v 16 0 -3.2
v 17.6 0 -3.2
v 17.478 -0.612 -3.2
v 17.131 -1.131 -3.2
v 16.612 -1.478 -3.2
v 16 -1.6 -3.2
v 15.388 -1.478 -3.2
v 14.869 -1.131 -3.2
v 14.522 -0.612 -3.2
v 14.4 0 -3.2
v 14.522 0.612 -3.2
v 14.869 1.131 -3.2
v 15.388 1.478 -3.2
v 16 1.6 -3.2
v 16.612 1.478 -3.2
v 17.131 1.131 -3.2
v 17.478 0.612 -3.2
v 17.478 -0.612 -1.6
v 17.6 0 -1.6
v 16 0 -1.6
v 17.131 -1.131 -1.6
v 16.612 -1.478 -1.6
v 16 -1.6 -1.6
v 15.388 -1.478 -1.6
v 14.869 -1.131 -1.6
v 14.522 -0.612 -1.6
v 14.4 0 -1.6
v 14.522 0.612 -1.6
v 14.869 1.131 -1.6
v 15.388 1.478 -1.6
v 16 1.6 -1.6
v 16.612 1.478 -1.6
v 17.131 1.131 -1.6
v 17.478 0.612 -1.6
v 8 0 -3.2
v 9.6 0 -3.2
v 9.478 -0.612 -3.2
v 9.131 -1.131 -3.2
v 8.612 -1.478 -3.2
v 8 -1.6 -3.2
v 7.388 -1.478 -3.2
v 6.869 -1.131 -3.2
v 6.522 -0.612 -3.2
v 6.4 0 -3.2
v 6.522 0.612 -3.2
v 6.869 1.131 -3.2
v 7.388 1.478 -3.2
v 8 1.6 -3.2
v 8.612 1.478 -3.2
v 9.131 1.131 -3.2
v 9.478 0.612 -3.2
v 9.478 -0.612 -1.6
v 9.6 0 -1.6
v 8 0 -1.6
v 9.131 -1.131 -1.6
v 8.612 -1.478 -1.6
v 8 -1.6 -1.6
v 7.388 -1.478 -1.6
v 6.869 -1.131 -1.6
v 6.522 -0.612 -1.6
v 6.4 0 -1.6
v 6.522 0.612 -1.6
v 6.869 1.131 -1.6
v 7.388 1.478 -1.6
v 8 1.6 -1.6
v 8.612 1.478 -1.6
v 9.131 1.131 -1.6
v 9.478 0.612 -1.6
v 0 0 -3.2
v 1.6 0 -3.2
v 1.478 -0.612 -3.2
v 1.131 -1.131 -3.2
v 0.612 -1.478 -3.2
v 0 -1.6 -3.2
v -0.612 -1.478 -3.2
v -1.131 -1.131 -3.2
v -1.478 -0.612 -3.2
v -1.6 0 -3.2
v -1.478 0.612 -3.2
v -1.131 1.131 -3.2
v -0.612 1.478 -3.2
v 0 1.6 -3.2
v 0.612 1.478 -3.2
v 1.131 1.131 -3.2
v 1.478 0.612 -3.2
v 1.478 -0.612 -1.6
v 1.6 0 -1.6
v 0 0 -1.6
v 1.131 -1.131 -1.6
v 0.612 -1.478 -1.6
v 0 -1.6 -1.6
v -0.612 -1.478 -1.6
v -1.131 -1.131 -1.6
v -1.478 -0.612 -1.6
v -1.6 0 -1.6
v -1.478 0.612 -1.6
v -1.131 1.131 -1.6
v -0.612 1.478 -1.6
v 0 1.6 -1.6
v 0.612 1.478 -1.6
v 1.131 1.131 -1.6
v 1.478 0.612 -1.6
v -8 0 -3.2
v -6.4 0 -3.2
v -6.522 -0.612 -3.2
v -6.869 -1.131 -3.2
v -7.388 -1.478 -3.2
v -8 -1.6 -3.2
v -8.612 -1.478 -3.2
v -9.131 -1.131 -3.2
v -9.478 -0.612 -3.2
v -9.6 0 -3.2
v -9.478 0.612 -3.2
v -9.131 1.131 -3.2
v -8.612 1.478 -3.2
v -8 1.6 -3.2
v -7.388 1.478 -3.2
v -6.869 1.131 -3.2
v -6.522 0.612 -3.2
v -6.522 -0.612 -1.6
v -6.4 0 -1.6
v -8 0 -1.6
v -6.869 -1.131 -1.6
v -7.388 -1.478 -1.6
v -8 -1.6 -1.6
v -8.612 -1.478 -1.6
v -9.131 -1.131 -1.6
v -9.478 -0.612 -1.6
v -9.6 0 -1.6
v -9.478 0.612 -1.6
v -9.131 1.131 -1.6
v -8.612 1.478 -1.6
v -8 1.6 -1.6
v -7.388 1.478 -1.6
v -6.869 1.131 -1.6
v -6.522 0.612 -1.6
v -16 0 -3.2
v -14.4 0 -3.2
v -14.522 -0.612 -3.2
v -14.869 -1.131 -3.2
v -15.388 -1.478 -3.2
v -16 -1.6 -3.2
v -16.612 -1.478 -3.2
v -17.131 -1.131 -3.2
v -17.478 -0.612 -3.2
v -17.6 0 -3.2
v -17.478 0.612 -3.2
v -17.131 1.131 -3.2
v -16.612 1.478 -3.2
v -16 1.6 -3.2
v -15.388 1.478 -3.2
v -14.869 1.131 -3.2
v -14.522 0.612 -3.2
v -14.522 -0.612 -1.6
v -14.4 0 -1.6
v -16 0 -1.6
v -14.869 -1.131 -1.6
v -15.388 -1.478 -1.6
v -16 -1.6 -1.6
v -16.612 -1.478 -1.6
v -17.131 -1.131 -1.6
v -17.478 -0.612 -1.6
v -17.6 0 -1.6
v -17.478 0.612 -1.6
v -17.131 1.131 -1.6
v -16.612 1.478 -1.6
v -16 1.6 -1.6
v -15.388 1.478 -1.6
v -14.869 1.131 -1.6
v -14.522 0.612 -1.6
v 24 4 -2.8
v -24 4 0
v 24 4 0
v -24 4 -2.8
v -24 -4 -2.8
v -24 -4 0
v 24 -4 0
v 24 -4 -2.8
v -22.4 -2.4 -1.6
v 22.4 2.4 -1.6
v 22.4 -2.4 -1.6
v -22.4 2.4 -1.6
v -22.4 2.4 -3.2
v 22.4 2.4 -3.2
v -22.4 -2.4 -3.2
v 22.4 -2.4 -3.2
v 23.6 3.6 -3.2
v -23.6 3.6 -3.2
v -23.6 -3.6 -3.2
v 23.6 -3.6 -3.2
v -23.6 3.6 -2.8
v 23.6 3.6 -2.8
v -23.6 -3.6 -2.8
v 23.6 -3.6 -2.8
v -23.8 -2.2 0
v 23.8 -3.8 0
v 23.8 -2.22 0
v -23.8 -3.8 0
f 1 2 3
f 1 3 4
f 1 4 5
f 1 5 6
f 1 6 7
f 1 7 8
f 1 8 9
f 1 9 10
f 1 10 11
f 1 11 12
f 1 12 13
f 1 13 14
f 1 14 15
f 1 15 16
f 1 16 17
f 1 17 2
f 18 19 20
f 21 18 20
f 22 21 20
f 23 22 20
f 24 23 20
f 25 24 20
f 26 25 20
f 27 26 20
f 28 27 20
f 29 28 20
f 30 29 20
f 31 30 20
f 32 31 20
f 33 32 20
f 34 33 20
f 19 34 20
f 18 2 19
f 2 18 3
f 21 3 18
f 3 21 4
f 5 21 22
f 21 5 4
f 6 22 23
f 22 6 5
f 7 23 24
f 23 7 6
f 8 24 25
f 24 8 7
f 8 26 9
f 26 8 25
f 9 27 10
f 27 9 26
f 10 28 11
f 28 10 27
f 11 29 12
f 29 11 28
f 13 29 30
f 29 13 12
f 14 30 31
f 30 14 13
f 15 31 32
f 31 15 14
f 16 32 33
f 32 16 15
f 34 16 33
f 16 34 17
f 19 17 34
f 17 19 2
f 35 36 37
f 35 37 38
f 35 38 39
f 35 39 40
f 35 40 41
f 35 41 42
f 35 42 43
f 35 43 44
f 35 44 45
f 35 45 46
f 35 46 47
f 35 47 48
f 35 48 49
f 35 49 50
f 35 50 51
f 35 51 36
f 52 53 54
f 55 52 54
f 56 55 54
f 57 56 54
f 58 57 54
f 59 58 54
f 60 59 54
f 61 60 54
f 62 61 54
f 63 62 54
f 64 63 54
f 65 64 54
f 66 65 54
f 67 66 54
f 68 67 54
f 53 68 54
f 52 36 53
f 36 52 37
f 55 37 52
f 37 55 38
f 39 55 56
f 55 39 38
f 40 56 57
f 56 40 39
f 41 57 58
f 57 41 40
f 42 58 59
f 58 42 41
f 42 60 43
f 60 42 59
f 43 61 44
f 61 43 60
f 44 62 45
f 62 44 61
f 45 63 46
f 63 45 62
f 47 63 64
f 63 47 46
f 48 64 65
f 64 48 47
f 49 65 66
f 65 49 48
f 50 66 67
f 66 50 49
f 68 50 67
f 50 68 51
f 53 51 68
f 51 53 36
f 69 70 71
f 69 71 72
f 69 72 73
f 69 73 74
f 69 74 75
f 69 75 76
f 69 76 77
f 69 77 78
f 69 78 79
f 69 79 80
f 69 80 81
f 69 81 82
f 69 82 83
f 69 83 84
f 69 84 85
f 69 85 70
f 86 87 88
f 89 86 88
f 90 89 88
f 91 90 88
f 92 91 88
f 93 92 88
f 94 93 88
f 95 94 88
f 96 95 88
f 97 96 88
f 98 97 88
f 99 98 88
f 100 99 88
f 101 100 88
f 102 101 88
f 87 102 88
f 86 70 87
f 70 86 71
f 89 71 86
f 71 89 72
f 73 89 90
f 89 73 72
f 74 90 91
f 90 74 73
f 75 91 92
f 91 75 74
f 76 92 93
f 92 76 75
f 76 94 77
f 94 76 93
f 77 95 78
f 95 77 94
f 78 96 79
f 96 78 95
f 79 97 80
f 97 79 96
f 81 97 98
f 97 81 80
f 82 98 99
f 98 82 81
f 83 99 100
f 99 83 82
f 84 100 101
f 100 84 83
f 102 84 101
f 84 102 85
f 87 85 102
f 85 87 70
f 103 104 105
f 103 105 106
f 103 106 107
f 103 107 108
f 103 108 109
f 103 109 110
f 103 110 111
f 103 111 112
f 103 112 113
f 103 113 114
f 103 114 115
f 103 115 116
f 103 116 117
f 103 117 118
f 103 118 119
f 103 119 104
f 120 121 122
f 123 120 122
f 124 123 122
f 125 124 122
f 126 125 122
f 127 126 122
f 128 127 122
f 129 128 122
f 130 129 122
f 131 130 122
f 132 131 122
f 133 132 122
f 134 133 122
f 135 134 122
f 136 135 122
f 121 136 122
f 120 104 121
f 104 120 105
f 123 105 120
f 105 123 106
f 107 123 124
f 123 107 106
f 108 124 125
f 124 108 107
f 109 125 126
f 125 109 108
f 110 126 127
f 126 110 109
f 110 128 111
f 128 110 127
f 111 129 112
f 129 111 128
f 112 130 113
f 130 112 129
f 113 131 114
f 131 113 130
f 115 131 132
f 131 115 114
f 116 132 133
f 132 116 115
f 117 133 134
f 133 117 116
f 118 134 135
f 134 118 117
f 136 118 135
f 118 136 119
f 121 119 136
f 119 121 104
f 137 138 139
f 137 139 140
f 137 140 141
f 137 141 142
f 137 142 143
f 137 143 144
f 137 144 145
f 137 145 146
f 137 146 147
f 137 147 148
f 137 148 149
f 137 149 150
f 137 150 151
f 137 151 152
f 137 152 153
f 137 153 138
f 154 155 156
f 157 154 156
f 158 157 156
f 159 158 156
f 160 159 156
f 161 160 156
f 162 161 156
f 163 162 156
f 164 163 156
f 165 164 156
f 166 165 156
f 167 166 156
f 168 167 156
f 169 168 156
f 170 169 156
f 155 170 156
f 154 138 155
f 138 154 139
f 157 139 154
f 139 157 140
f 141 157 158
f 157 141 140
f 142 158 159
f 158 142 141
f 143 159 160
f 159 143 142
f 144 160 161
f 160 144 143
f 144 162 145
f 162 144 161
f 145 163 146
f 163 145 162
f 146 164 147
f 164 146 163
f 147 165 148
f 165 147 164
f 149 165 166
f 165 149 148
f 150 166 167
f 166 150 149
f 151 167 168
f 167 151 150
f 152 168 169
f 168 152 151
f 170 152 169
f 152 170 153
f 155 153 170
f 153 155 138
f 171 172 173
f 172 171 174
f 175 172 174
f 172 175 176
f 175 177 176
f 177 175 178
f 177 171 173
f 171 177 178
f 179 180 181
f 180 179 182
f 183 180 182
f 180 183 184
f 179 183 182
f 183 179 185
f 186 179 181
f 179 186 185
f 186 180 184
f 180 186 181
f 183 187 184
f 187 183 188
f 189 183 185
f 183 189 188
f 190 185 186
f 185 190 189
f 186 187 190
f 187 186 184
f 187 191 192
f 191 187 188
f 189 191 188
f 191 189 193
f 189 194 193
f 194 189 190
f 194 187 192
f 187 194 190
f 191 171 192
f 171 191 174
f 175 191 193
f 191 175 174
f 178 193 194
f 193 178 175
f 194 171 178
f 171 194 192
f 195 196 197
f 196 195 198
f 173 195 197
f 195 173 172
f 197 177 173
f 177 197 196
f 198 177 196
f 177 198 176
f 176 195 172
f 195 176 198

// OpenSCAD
// file: ../p/4-4edge.scad
use <../lib.scad>
function ldraw_lib__4_4edge() = [
// 0 Circle 1.0
// 0 Name: 4-4edge.dat
// 0 Author: James Jessiman
// 0 !LDRAW_ORG Primitive UPDATE 2017-01
// 0 !LICENSE Licensed under CC BY 2.0 and CC BY 4.0 : see CAreadme.txt
// 
// 0 BFC CERTIFY CCW
  [0,"BFC","CERTIFY"],
  [0,"BFC","CCW"],
// 
// 0 !HISTORY 1998-12-15 [PTadmin] Official Update 1998-10
// 0 !HISTORY 2005-12-28 [PTadmin] Official Update 2005-01
// 0 !HISTORY 2007-06-24 [PTadmin] Header formatted for Contributor Agreement
// 0 !HISTORY 2008-07-01 [PTadmin] Official Update 2008-01
// 0 !HISTORY 2017-01-15 [Steffen] BFCed
// 0 !HISTORY 2017-12-30 [PTadmin] Official Update 2017-01
// 
// 
// 2 24 1 0 0 0.9239 0 0.3827
  [2,24,1,0,0,0.9239,0,0.3827],
// 2 24 0.9239 0 0.3827 0.7071 0 0.7071
  [2,24,0.9239,0,0.3827,0.7071,0,0.7071],
// 2 24 0.7071 0 0.7071 0.3827 0 0.9239
  [2,24,0.7071,0,0.7071,0.3827,0,0.9239],
// 2 24 0.3827 0 0.9239 0 0 1
  [2,24,0.3827,0,0.9239,0,0,1],
// 2 24 0 0 1 -0.3827 0 0.9239
  [2,24,0,0,1,-0.3827,0,0.9239],
// 2 24 -0.3827 0 0.9239 -0.7071 0 0.7071
  [2,24,-0.3827,0,0.9239,-0.7071,0,0.7071],
// 2 24 -0.7071 0 0.7071 -0.9239 0 0.3827
  [2,24,-0.7071,0,0.7071,-0.9239,0,0.3827],
// 2 24 -0.9239 0 0.3827 -1 0 -0
  [2,24,-0.9239,0,0.3827,-1,0,-0],
// 2 24 -1 0 -0 -0.9239 0 -0.3827
  [2,24,-1,0,-0,-0.9239,0,-0.3827],
// 2 24 -0.9239 0 -0.3827 -0.7071 0 -0.7071
  [2,24,-0.9239,0,-0.3827,-0.7071,0,-0.7071],
// 2 24 -0.7071 0 -0.7071 -0.3827 0 -0.9239
  [2,24,-0.7071,0,-0.7071,-0.3827,0,-0.9239],
// 2 24 -0.3827 0 -0.9239 0 0 -1
  [2,24,-0.3827,0,-0.9239,0,0,-1],
// 2 24 0 0 -1 0.3827 0 -0.9239
  [2,24,0,0,-1,0.3827,0,-0.9239],
// 2 24 0.3827 0 -0.9239 0.7071 0 -0.7071
  [2,24,0.3827,0,-0.9239,0.7071,0,-0.7071],
// 2 24 0.7071 0 -0.7071 0.9239 0 -0.3827
  [2,24,0.7071,0,-0.7071,0.9239,0,-0.3827],
// 2 24 0.9239 0 -0.3827 1 0 0
  [2,24,0.9239,0,-0.3827,1,0,0],
];
module ldraw_lib__4_4edge(step=0, col=false, unit=2/5, alt=false, line=0.2, solid=!$preview)
    makepoly(ldraw_lib__4_4edge(), step=step, col=col, unit=unit, alt=alt, line=line, solid=solid);
ldraw_lib__4_4edge(line=0.2);
// file: ../p/4-4disc.scad
use <../lib.scad>
function ldraw_lib__4_4disc() = [
// 0 Disc 1.0
// 0 Name: 4-4disc.dat
// 0 Author: James Jessiman
// 0 !LDRAW_ORG Primitive UPDATE 2002-02
// 0 !LICENSE Licensed under CC BY 2.0 and CC BY 4.0 : see CAreadme.txt
// 
// 0 BFC CERTIFY CCW
  [0,"BFC","CERTIFY"],
  [0,"BFC","CCW"],
// 
// 0 !HISTORY 1998-12-15 [PTadmin] Official Update 1998-10
// 0 !HISTORY 2002-03-23 [sbliss] Added BFC statement
// 0 !HISTORY 2002-04-25 [PTadmin] Official Update 2002-02
// 0 !HISTORY 2007-06-24 [PTadmin] Header formatted for Contributor Agreement
// 0 !HISTORY 2008-07-01 [PTadmin] Official Update 2008-01
// 
// 
// 3 16 0 0 0 1 0 0 0.9239 0 0.3827
  [3,16,0,0,0,1,0,0,0.9239,0,0.3827],
// 3 16 0 0 0 0.9239 0 0.3827 0.7071 0 0.7071
  [3,16,0,0,0,0.9239,0,0.3827,0.7071,0,0.7071],
// 3 16 0 0 0 0.7071 0 0.7071 0.3827 0 0.9239
  [3,16,0,0,0,0.7071,0,0.7071,0.3827,0,0.9239],
// 3 16 0 0 0 0.3827 0 0.9239 0 0 1
  [3,16,0,0,0,0.3827,0,0.9239,0,0,1],
// 3 16 0 0 0 0 0 1 -0.3827 0 0.9239
  [3,16,0,0,0,0,0,1,-0.3827,0,0.9239],
// 3 16 0 0 0 -0.3827 0 0.9239 -0.7071 0 0.7071
  [3,16,0,0,0,-0.3827,0,0.9239,-0.7071,0,0.7071],
// 3 16 0 0 0 -0.7071 0 0.7071 -0.9239 0 0.3827
  [3,16,0,0,0,-0.7071,0,0.7071,-0.9239,0,0.3827],
// 3 16 0 0 0 -0.9239 0 0.3827 -1 0 -0
  [3,16,0,0,0,-0.9239,0,0.3827,-1,0,-0],
// 3 16 0 0 0 -1 0 -0 -0.9239 0 -0.3827
  [3,16,0,0,0,-1,0,-0,-0.9239,0,-0.3827],
// 3 16 0 0 0 -0.9239 0 -0.3827 -0.7071 0 -0.7071
  [3,16,0,0,0,-0.9239,0,-0.3827,-0.7071,0,-0.7071],
// 3 16 0 0 0 -0.7071 0 -0.7071 -0.3827 0 -0.9239
  [3,16,0,0,0,-0.7071,0,-0.7071,-0.3827,0,-0.9239],
// 3 16 0 0 0 -0.3827 0 -0.9239 0 0 -1
  [3,16,0,0,0,-0.3827,0,-0.9239,0,0,-1],
// 3 16 0 0 0 0 0 -1 0.3827 0 -0.9239
  [3,16,0,0,0,0,0,-1,0.3827,0,-0.9239],
// 3 16 0 0 0 0.3827 0 -0.9239 0.7071 0 -0.7071
  [3,16,0,0,0,0.3827,0,-0.9239,0.7071,0,-0.7071],
// 3 16 0 0 0 0.7071 0 -0.7071 0.9239 0 -0.3827
  [3,16,0,0,0,0.7071,0,-0.7071,0.9239,0,-0.3827],
// 3 16 0 0 0 0.9239 0 -0.3827 1 0 0
  [3,16,0,0,0,0.9239,0,-0.3827,1,0,0],
// 0
];
module ldraw_lib__4_4disc(step=0, col=false, unit=2/5, alt=false, line=0.2, solid=!$preview)
    makepoly(ldraw_lib__4_4disc(), step=step, col=col, unit=unit, alt=alt, line=line, solid=solid);
ldraw_lib__4_4disc(line=0.2);
// file: ../p/4-4cyli.scad
use <../lib.scad>
$fa=1; $fs=0.2;
function ldraw_lib__4_4cyli(realsolid=false) = [
// 0 Cylinder 1.0
// 0 Name: 4-4cyli.dat
// 0 Author: James Jessiman
// 0 !LDRAW_ORG Primitive UPDATE 2005-01
// 0 !LICENSE Licensed under CC BY 2.0 and CC BY 4.0 : see CAreadme.txt
// 
// 0 BFC CERTIFY CCW
  [0,"BFC","CERTIFY"],
  [0,"BFC","CCW"],
// 
// 0 !HISTORY 1998-12-15 [PTadmin] Official Update 1998-10
// 0 !HISTORY 2002-03-23 [sbliss] Added BFC statement; merged headers from files in distributions LDraw 0.27 and Complete.
// 0 !HISTORY 2002-04-25 [PTadmin] Official Update 2002-02
// 0 !HISTORY 2004-12-14 [guyvivan] BFC CCW
// 0 !HISTORY 2005-12-28 [PTadmin] Official Update 2005-01
// 0 !HISTORY 2007-06-24 [PTadmin] Header formatted for Contributor Agreement
// 0 !HISTORY 2008-07-01 [PTadmin] Official Update 2008-01
// 
// 
// 4 16 1 1 0 0.9239 1 0.3827 0.9239 0 0.3827 1 0 0
  [4,16,1,1,0,0.9239,1,0.3827,0.9239,0,0.3827,1,0,0],
// 5 24 1 0 0 1 1 0 0.9239 0 0.3827 0.9239 0 -0.3827
  [5,24,1,0,0,1,1,0,0.9239,0,0.3827,0.9239,0,-0.3827],
// 4 16 0.9239 1 0.3827 0.7071 1 0.7071 0.7071 0 0.7071 0.9239 0 0.3827
  [4,16,0.9239,1,0.3827,0.7071,1,0.7071,0.7071,0,0.7071,0.9239,0,0.3827],
// 5 24 0.9239 0 0.3827 0.9239 1 0.3827 0.7071 0 0.7071 1 0 0
  [5,24,0.9239,0,0.3827,0.9239,1,0.3827,0.7071,0,0.7071,1,0,0],
// 4 16 0.7071 1 0.7071 0.3827 1 0.9239 0.3827 0 0.9239 0.7071 0 0.7071
  [4,16,0.7071,1,0.7071,0.3827,1,0.9239,0.3827,0,0.9239,0.7071,0,0.7071],
// 5 24 0.7071 0 0.7071 0.7071 1 0.7071 0.3827 0 0.9239 0.9239 0 0.3827
  [5,24,0.7071,0,0.7071,0.7071,1,0.7071,0.3827,0,0.9239,0.9239,0,0.3827],
// 4 16 0.3827 1 0.9239 0 1 1 0 0 1 0.3827 0 0.9239
  [4,16,0.3827,1,0.9239,0,1,1,0,0,1,0.3827,0,0.9239],
// 5 24 0.3827 0 0.9239 0.3827 1 0.9239 0 0 1 0.7071 0 0.7071
  [5,24,0.3827,0,0.9239,0.3827,1,0.9239,0,0,1,0.7071,0,0.7071],
// 4 16 0 1 1 -0.3827 1 0.9239 -0.3827 0 0.9239 0 0 1
  [4,16,0,1,1,-0.3827,1,0.9239,-0.3827,0,0.9239,0,0,1],
// 5 24 0 0 1 0 1 1 -0.3827 0 0.9239 0.3827 0 0.9239
  [5,24,0,0,1,0,1,1,-0.3827,0,0.9239,0.3827,0,0.9239],
// 4 16 -0.3827 1 0.9239 -0.7071 1 0.7071 -0.7071 0 0.7071 -0.3827 0 0.9239
  [4,16,-0.3827,1,0.9239,-0.7071,1,0.7071,-0.7071,0,0.7071,-0.3827,0,0.9239],
// 5 24 -0.3827 0 0.9239 -0.3827 1 0.9239 -0.7071 0 0.7071 0 0 1
  [5,24,-0.3827,0,0.9239,-0.3827,1,0.9239,-0.7071,0,0.7071,0,0,1],
// 4 16 -0.7071 1 0.7071 -0.9239 1 0.3827 -0.9239 0 0.3827 -0.7071 0 0.7071
  [4,16,-0.7071,1,0.7071,-0.9239,1,0.3827,-0.9239,0,0.3827,-0.7071,0,0.7071],
// 5 24 -0.7071 0 0.7071 -0.7071 1 0.7071 -0.9239 0 0.3827 -0.3827 0 0.9239
  [5,24,-0.7071,0,0.7071,-0.7071,1,0.7071,-0.9239,0,0.3827,-0.3827,0,0.9239],
// 4 16 -0.9239 1 0.3827 -1 1 0 -1 0 0 -0.9239 0 0.3827
  [4,16,-0.9239,1,0.3827,-1,1,0,-1,0,0,-0.9239,0,0.3827],
// 5 24 -0.9239 0 0.3827 -0.9239 1 0.3827 -1 0 0 -0.7071 0 0.7071
  [5,24,-0.9239,0,0.3827,-0.9239,1,0.3827,-1,0,0,-0.7071,0,0.7071],
// 4 16 -1 1 0 -0.9239 1 -0.3827 -0.9239 0 -0.3827 -1 0 0
  [4,16,-1,1,0,-0.9239,1,-0.3827,-0.9239,0,-0.3827,-1,0,0],
// 5 24 -1 0 0 -1 1 0 -0.9239 0 -0.3827 -0.9239 0 0.3827
  [5,24,-1,0,0,-1,1,0,-0.9239,0,-0.3827,-0.9239,0,0.3827],
// 4 16 -0.9239 1 -0.3827 -0.7071 1 -0.7071 -0.7071 0 -0.7071 -0.9239 0 -0.3827
  [4,16,-0.9239,1,-0.3827,-0.7071,1,-0.7071,-0.7071,0,-0.7071,-0.9239,0,-0.3827],
// 5 24 -0.9239 0 -0.3827 -0.9239 1 -0.3827 -0.7071 0 -0.7071 -1 0 0
  [5,24,-0.9239,0,-0.3827,-0.9239,1,-0.3827,-0.7071,0,-0.7071,-1,0,0],
// 4 16 -0.7071 1 -0.7071 -0.3827 1 -0.9239 -0.3827 0 -0.9239 -0.7071 0 -0.7071
  [4,16,-0.7071,1,-0.7071,-0.3827,1,-0.9239,-0.3827,0,-0.9239,-0.7071,0,-0.7071],
// 5 24 -0.7071 0 -0.7071 -0.7071 1 -0.7071 -0.3827 0 -0.9239 -0.9239 0 -0.3827
  [5,24,-0.7071,0,-0.7071,-0.7071,1,-0.7071,-0.3827,0,-0.9239,-0.9239,0,-0.3827],
// 4 16 -0.3827 1 -0.9239 0 1 -1 0 0 -1 -0.3827 0 -0.9239
  [4,16,-0.3827,1,-0.9239,0,1,-1,0,0,-1,-0.3827,0,-0.9239],
// 5 24 -0.3827 0 -0.9239 -0.3827 1 -0.9239 0 0 -1 -0.7071 0 -0.7071
  [5,24,-0.3827,0,-0.9239,-0.3827,1,-0.9239,0,0,-1,-0.7071,0,-0.7071],
// 4 16 0 1 -1 0.3827 1 -0.9239 0.3827 0 -0.9239 0 0 -1
  [4,16,0,1,-1,0.3827,1,-0.9239,0.3827,0,-0.9239,0,0,-1],
// 5 24 0 0 -1 0 1 -1 0.3827 0 -0.9239 -0.3827 0 -0.9239
  [5,24,0,0,-1,0,1,-1,0.3827,0,-0.9239,-0.3827,0,-0.9239],
// 4 16 0.3827 1 -0.9239 0.7071 1 -0.7071 0.7071 0 -0.7071 0.3827 0 -0.9239
  [4,16,0.3827,1,-0.9239,0.7071,1,-0.7071,0.7071,0,-0.7071,0.3827,0,-0.9239],
// 5 24 0.3827 0 -0.9239 0.3827 1 -0.9239 0.7071 0 -0.7071 0 0 -1
  [5,24,0.3827,0,-0.9239,0.3827,1,-0.9239,0.7071,0,-0.7071,0,0,-1],
// 4 16 0.7071 1 -0.7071 0.9239 1 -0.3827 0.9239 0 -0.3827 0.7071 0 -0.7071
  [4,16,0.7071,1,-0.7071,0.9239,1,-0.3827,0.9239,0,-0.3827,0.7071,0,-0.7071],
// 5 24 0.7071 0 -0.7071 0.7071 1 -0.7071 0.9239 0 -0.3827 0.3827 0 -0.9239
  [5,24,0.7071,0,-0.7071,0.7071,1,-0.7071,0.9239,0,-0.3827,0.3827,0,-0.9239],
// 4 16 0.9239 1 -0.3827 1 1 0 1 0 0 0.9239 0 -0.3827
  [4,16,0.9239,1,-0.3827,1,1,0,1,0,0,0.9239,0,-0.3827],
// 5 24 0.9239 0 -0.3827 0.9239 1 -0.3827 1 0 0 0.7071 0 -0.7071
  [5,24,0.9239,0,-0.3827,0.9239,1,-0.3827,1,0,0,0.7071,0,-0.7071],
// 0
];
module ldraw_lib__4_4cyli(step=0, col=false, unit=2/5, alt=false, line=0.2, solid=!$preview)
    makepoly(ldraw_lib__4_4cyli(solid), step=step, col=col, unit=unit, alt=alt, line=line, solid=solid);
ldraw_lib__4_4cyli(line=0.2);
// file: ../p/stud3.scad
use <../lib.scad>
use <4-4cyli.scad>
use <4-4disc.scad>
use <4-4edge.scad>
function ldraw_lib__stud3() = [
// 0 Stud Tube Solid
// 0 Name: stud3.dat
// 0 Author: James Jessiman
// 0 !LDRAW_ORG Primitive UPDATE 2012-01
// 0 !LICENSE Licensed under CC BY 4.0 : see CAreadme.txt
// 
// 0 BFC CERTIFY CCW
  [0,"BFC","CERTIFY"],
  [0,"BFC","CCW"],
// 
// 0 !HISTORY 2002-04-04 [sbliss] Modified for BFC compliance
// 0 !HISTORY 2002-04-25 [PTadmin] Official Update 2002-02
// 0 !HISTORY 2007-06-24 [PTadmin] Header formatted for Contributor Agreement
// 0 !HISTORY 2008-07-01 [PTadmin] Official Update 2008-01
// 0 !HISTORY 2012-02-16 [Philo] Changed to CCW
// 0 !HISTORY 2012-03-30 [PTadmin] Official Update 2012-01
// 
// 
// 1 16 0 -4 0 4 0 0 0 1 0 0 0 4 4-4edge.dat
  [1,16,0,-4,0,4,0,0,0,1,0,0,0,4, ldraw_lib__4_4edge()],
// 1 16 0 0 0 4 0 0 0 1 0 0 0 4 4-4edge.dat
  [1,16,0,0,0,4,0,0,0,1,0,0,0,4, ldraw_lib__4_4edge()],
// 1 16 0 -4 0 4 0 0 0 1 0 0 0 4 4-4disc.dat
  [1,16,0,-4,0,4,0,0,0,1,0,0,0,4, ldraw_lib__4_4disc()],
  [-1,16,0,0,0,4,0,0,0,-1,0,0,0,4, ldraw_lib__4_4disc()],
// 1 16 0 -4 0 4 0 0 0 4 0 0 0 4 4-4cyli.dat
  [1,16,0,-4,0,4,0,0,0,4,0,0,0,4, ldraw_lib__4_4cyli()],
];
module ldraw_lib__stud3(step=0, col=false, unit=2/5, alt=false, line=0.2, solid=!$preview)
    makepoly(ldraw_lib__stud3(), step=step, col=col, unit=unit, alt=alt, line=line, solid=solid);
ldraw_lib__stud3(line=0.2);
// file: ../p/box5.scad
use <../lib.scad>
function ldraw_lib__box5() = [
// 0 Box with 5 Faces and All Edges
// 0 Name: box5.dat
// 0 Author: James Jessiman
// 0 !LDRAW_ORG Primitive UPDATE 2012-01
// 0 !LICENSE Licensed under CC BY 2.0 and CC BY 4.0 : see CAreadme.txt
// 
// 0 BFC CERTIFY CCW
  [0,"BFC","CERTIFY"],
  [0,"BFC","CCW"],
// 
// 0 !HISTORY 2002-04-03 [sbliss] Modified for BFC compliance
// 0 !HISTORY 2002-04-25 [PTadmin] Official Update 2002-02
// 0 !HISTORY 2007-06-24 [PTadmin] Header formatted for Contributor Agreement
// 0 !HISTORY 2008-07-01 [PTadmin] Official Update 2008-01
// 0 !HISTORY 2012-02-16 [Philo] Changed to CCW
// 0 !HISTORY 2012-03-30 [PTadmin] Official Update 2012-01
// 
// 
// 2 24 1 1 1 -1 1 1
  [2,24,1,1,1,-1,1,1],
// 2 24 -1 1 1 -1 1 -1
  [2,24,-1,1,1,-1,1,-1],
// 2 24 -1 1 -1 1 1 -1
  [2,24,-1,1,-1,1,1,-1],
// 2 24 1 1 -1 1 1 1
  [2,24,1,1,-1,1,1,1],
// 2 24 1 0 1 -1 0 1
  [2,24,1,0,1,-1,0,1],
// 2 24 -1 0 1 -1 0 -1
  [2,24,-1,0,1,-1,0,-1],
// 2 24 -1 0 -1 1 0 -1
  [2,24,-1,0,-1,1,0,-1],
// 2 24 1 0 -1 1 0 1
  [2,24,1,0,-1,1,0,1],
// 2 24 1 0 1 1 1 1
  [2,24,1,0,1,1,1,1],
// 2 24 -1 0 1 -1 1 1
  [2,24,-1,0,1,-1,1,1],
// 2 24 1 0 -1 1 1 -1
  [2,24,1,0,-1,1,1,-1],
// 2 24 -1 0 -1 -1 1 -1
  [2,24,-1,0,-1,-1,1,-1],
// 4 16 -1 1 1 1 1 1 1 1 -1 -1 1 -1
  [4,16,-1,1,1,1,1,1,1,1,-1,-1,1,-1],
// 4 16 -1 1 1 -1 0 1 1 0 1 1 1 1
  [4,16,-1,1,1,-1,0,1,1,0,1,1,1,1],
// 4 16 -1 1 -1 -1 0 -1 -1 0 1 -1 1 1
  [4,16,-1,1,-1,-1,0,-1,-1,0,1,-1,1,1],
// 4 16 1 1 -1 1 0 -1 -1 0 -1 -1 1 -1
  [4,16,1,1,-1,1,0,-1,-1,0,-1,-1,1,-1],
// 4 16 1 1 1 1 0 1 1 0 -1 1 1 -1
  [4,16,1,1,1,1,0,1,1,0,-1,1,1,-1],
];
makepoly(ldraw_lib__box5(), line=0.2);
// file: ../p/box4.scad
use <../lib.scad>
function ldraw_lib__box4() = [
// 0 Box with 4 Faces (2 Parallel Pairs) and All Edges
// 0 Name: box4.dat
// 0 Author: James Jessiman
// 0 !LDRAW_ORG Primitive UPDATE 2012-01
// 0 !LICENSE Licensed under CC BY 4.0 : see CAreadme.txt
// 
// 0 BFC CERTIFY CCW
  [0,"BFC","CERTIFY"],
  [0,"BFC","CCW"],
// 
// 0 !HISTORY 2002-04-03 [sbliss] Modified for BFC compliance
// 0 !HISTORY 2002-04-25 [PTadmin] Official Update 2002-02
// 0 !HISTORY 2007-06-24 [PTadmin] Header formatted for Contributor Agreement
// 0 !HISTORY 2008-07-01 [PTadmin] Official Update 2008-01
// 0 !HISTORY 2012-02-16 [Philo] Changed to CCW
// 0 !HISTORY 2012-03-30 [PTadmin] Official Update 2012-01
// 
// 
// 2 24 1 1 1 -1 1 1
  [2,24,1,1,1,-1,1,1],
// 2 24 -1 1 1 -1 1 -1
  [2,24,-1,1,1,-1,1,-1],
// 2 24 -1 1 -1 1 1 -1
  [2,24,-1,1,-1,1,1,-1],
// 2 24 1 1 -1 1 1 1
  [2,24,1,1,-1,1,1,1],
// 2 24 1 0 1 -1 0 1
  [2,24,1,0,1,-1,0,1],
// 2 24 -1 0 1 -1 0 -1
  [2,24,-1,0,1,-1,0,-1],
// 2 24 -1 0 -1 1 0 -1
  [2,24,-1,0,-1,1,0,-1],
// 2 24 1 0 -1 1 0 1
  [2,24,1,0,-1,1,0,1],
// 2 24 1 0 1 1 1 1
  [2,24,1,0,1,1,1,1],
// 2 24 -1 0 1 -1 1 1
  [2,24,-1,0,1,-1,1,1],
// 2 24 1 0 -1 1 1 -1
  [2,24,1,0,-1,1,1,-1],
// 2 24 -1 0 -1 -1 1 -1
  [2,24,-1,0,-1,-1,1,-1],
// 4 16 -1 1 1 -1 0 1 1 0 1 1 1 1
  [4,16,-1,1,1,-1,0,1,1,0,1,1,1,1],
// 4 16 -1 1 -1 -1 0 -1 -1 0 1 -1 1 1
  [4,16,-1,1,-1,-1,0,-1,-1,0,1,-1,1,1],
// 4 16 1 1 -1 1 0 -1 -1 0 -1 -1 1 -1
  [4,16,1,1,-1,1,0,-1,-1,0,-1,-1,1,-1],
// 4 16 1 1 1 1 0 1 1 0 -1 1 1 -1
  [4,16,1,1,1,1,0,1,1,0,-1,1,1,-1],
];
module ldraw_lib__box4(step=0, col=false, unit=2/5, alt=false, line=0.2, solid=!$preview)
    makepoly(ldraw_lib__box4(), step=step, col=col, unit=unit, alt=alt, line=line, solid=solid);
ldraw_lib__box4(line=0.2);
// file: s/6636s01.scad
use <../../lib.scad>
use <../../p/box4.scad>
use <../../p/box5.scad>
use <../../p/stud3.scad>
function ldraw_lib__s__6636s01() = [
// 0 ~Tile  1 x  6 without Top Face
// 0 Name: s\6636s01.dat
// 0 Author: C.L.Rasmussen [johnny-thunder]
// 0 !LDRAW_ORG Subpart UPDATE 2009-03
// 0 !LICENSE Licensed under CC BY 2.0 and CC BY 4.0 : see CAreadme.txt
// 
// 0 BFC CERTIFY CCW
  [0,"BFC","CERTIFY"],
  [0,"BFC","CCW"],
// 
// 0 !HISTORY 2009-12-29 [PTadmin] Official Update 2009-03
// 
// 
// 1 16 40 4 0 1 0 0 0 -1 0 0 0 -1 stud3.dat
  [1,16,40,4,0,1,0,0,0,-1,0,0,0,-1, ldraw_lib__stud3()],
// 1 16 20 4 0 1 0 0 0 -1 0 0 0 -1 stud3.dat
  [1,16,20,4,0,1,0,0,0,-1,0,0,0,-1, ldraw_lib__stud3()],
// 1 16 0 4 0 1 0 0 0 -1 0 0 0 -1 stud3.dat
  [1,16,0,4,0,1,0,0,0,-1,0,0,0,-1, ldraw_lib__stud3()],
// 1 16 -20 4 0 1 0 0 0 -1 0 0 0 -1 stud3.dat
  [1,16,-20,4,0,1,0,0,0,-1,0,0,0,-1, ldraw_lib__stud3()],
// 1 16 -40 4 0 1 0 0 0 -1 0 0 0 -1 stud3.dat
  [1,16,-40,4,0,1,0,0,0,-1,0,0,0,-1, ldraw_lib__stud3()],
// 1 16 0 7 0 60 0 0 0 -7 0 0 0 10 box4.dat
  [1,16,0,7,0,60,0,0,0,-7,0,0,0,10, ldraw_lib__box4()],
// 0 BFC INVERTNEXT
  [0,"BFC","INVERTNEXT"],
// 1 16 0 8 0 56 0 0 0 -4 0 0 0 6 box5.dat
  [1,16,0,8,0,56,0,0,0,-4,0,0,0,6, ldraw_lib__box5()],
// 4 16 59 8 9 56 8 6 -56 8 6 -59 8 9
  [4,16,59,8,9,56,8,6,-56,8,6,-59,8,9],
// 4 16 -59 8 9 -56 8 6 -56 8 -6 -59 8 -9
  [4,16,-59,8,9,-56,8,6,-56,8,-6,-59,8,-9],
// 4 16 -59 8 -9 -56 8 -6 56 8 -6 59 8 -9
  [4,16,-59,8,-9,-56,8,-6,56,8,-6,59,8,-9],
// 4 16 59 8 -9 56 8 -6 56 8 6 59 8 9
  [4,16,59,8,-9,56,8,-6,56,8,6,59,8,9],
// 1 16 0 8 0 59 0 0 0 -1 0 0 0 9 box4.dat
  [1,16,0,8,0,59,0,0,0,-1,0,0,0,9, ldraw_lib__box4()],
// 4 16 60 7 10 59 7 9 -59 7 9 -60 7 10
  [4,16,60,7,10,59,7,9,-59,7,9,-60,7,10],
// 4 16 -60 7 10 -59 7 9 -59 7 -9 -60 7 -10
  [4,16,-60,7,10,-59,7,9,-59,7,-9,-60,7,-10],
// 4 16 -60 7 -10 -59 7 -9 59 7 -9 60 7 -10
  [4,16,-60,7,-10,-59,7,-9,59,7,-9,60,7,-10],
// 4 16 60 7 -10 59 7 -9 59 7 9 60 7 10
  [4,16,60,7,-10,59,7,-9,59,7,9,60,7,10],
// 0
];
makepoly(ldraw_lib__s__6636s01(), line=0.2);
// main file
use <../lib.scad>
use <s/6636s01.scad>
function ldraw_lib__6636p0d() = [
// 0 Tile  1 x  6 with Metallic Silver Stripe Pattern
// 0 Name: 6636p0d.dat
// 0 Author: Vincent Messenet [Cheenzo]
// 0 !LDRAW_ORG Part UPDATE 2024-07
// 0 !LICENSE Licensed under CC BY 4.0 : see CAreadme.txt
// 
// 0 BFC CERTIFY CCW
  [0,"BFC","CERTIFY"],
  [0,"BFC","CCW"],
// 
// 0 !KEYWORDS Bricklink 6636pb325, Brickowl 1452988, Rebrickable 6636pr0038
// 0 !KEYWORDS Set 10321
// 
// 0 !HISTORY 2024-08-26 [OrionP] Official Update 2024-07
// 
// 1 16 0 0 0 1 0 0 0 1 0 0 0 1 s\6636s01.dat
  [1,16,0,0,0,1,0,0,0,1,0,0,0,1, ldraw_lib__s__6636s01()],
// 
// 4 80 59.5 0 -5.55 -59.5 0 -5.5 -59.5 0 -9.5 59.5 0 -9.5
  [4,80,59.5,0,-5.55,-59.5,0,-5.5,-59.5,0,-9.5,59.5,0,-9.5],
// 4 16 59.5 0 -5.55 60 0 10 -60 0 10 -59.5 0 -5.5
  [4,16,59.5,0,-5.55,60,0,10,-60,0,10,-59.5,0,-5.5],
// 4 16 59.5 0 -9.5 60 0 -10 60 0 10 59.5 0 -5.55
  [4,16,59.5,0,-9.5,60,0,-10,60,0,10,59.5,0,-5.55],
// 4 16 -60 0 -10 60 0 -10 59.5 0 -9.5 -59.5 0 -9.5
  [4,16,-60,0,-10,60,0,-10,59.5,0,-9.5,-59.5,0,-9.5],
// 4 16 -60 0 -10 -59.5 0 -9.5 -59.5 0 -5.5 -60 0 10
  [4,16,-60,0,-10,-59.5,0,-9.5,-59.5,0,-5.5,-60,0,10],
];
module ldraw_lib__6636p0d(step=0, col=false, unit=2/5, alt=false, line=0.2, solid=!$preview)
    makepoly(ldraw_lib__6636p0d(), step=step, col=col, unit=unit, alt=alt, line=line, solid=solid);
ldraw_lib__6636p0d(line=0.2);
